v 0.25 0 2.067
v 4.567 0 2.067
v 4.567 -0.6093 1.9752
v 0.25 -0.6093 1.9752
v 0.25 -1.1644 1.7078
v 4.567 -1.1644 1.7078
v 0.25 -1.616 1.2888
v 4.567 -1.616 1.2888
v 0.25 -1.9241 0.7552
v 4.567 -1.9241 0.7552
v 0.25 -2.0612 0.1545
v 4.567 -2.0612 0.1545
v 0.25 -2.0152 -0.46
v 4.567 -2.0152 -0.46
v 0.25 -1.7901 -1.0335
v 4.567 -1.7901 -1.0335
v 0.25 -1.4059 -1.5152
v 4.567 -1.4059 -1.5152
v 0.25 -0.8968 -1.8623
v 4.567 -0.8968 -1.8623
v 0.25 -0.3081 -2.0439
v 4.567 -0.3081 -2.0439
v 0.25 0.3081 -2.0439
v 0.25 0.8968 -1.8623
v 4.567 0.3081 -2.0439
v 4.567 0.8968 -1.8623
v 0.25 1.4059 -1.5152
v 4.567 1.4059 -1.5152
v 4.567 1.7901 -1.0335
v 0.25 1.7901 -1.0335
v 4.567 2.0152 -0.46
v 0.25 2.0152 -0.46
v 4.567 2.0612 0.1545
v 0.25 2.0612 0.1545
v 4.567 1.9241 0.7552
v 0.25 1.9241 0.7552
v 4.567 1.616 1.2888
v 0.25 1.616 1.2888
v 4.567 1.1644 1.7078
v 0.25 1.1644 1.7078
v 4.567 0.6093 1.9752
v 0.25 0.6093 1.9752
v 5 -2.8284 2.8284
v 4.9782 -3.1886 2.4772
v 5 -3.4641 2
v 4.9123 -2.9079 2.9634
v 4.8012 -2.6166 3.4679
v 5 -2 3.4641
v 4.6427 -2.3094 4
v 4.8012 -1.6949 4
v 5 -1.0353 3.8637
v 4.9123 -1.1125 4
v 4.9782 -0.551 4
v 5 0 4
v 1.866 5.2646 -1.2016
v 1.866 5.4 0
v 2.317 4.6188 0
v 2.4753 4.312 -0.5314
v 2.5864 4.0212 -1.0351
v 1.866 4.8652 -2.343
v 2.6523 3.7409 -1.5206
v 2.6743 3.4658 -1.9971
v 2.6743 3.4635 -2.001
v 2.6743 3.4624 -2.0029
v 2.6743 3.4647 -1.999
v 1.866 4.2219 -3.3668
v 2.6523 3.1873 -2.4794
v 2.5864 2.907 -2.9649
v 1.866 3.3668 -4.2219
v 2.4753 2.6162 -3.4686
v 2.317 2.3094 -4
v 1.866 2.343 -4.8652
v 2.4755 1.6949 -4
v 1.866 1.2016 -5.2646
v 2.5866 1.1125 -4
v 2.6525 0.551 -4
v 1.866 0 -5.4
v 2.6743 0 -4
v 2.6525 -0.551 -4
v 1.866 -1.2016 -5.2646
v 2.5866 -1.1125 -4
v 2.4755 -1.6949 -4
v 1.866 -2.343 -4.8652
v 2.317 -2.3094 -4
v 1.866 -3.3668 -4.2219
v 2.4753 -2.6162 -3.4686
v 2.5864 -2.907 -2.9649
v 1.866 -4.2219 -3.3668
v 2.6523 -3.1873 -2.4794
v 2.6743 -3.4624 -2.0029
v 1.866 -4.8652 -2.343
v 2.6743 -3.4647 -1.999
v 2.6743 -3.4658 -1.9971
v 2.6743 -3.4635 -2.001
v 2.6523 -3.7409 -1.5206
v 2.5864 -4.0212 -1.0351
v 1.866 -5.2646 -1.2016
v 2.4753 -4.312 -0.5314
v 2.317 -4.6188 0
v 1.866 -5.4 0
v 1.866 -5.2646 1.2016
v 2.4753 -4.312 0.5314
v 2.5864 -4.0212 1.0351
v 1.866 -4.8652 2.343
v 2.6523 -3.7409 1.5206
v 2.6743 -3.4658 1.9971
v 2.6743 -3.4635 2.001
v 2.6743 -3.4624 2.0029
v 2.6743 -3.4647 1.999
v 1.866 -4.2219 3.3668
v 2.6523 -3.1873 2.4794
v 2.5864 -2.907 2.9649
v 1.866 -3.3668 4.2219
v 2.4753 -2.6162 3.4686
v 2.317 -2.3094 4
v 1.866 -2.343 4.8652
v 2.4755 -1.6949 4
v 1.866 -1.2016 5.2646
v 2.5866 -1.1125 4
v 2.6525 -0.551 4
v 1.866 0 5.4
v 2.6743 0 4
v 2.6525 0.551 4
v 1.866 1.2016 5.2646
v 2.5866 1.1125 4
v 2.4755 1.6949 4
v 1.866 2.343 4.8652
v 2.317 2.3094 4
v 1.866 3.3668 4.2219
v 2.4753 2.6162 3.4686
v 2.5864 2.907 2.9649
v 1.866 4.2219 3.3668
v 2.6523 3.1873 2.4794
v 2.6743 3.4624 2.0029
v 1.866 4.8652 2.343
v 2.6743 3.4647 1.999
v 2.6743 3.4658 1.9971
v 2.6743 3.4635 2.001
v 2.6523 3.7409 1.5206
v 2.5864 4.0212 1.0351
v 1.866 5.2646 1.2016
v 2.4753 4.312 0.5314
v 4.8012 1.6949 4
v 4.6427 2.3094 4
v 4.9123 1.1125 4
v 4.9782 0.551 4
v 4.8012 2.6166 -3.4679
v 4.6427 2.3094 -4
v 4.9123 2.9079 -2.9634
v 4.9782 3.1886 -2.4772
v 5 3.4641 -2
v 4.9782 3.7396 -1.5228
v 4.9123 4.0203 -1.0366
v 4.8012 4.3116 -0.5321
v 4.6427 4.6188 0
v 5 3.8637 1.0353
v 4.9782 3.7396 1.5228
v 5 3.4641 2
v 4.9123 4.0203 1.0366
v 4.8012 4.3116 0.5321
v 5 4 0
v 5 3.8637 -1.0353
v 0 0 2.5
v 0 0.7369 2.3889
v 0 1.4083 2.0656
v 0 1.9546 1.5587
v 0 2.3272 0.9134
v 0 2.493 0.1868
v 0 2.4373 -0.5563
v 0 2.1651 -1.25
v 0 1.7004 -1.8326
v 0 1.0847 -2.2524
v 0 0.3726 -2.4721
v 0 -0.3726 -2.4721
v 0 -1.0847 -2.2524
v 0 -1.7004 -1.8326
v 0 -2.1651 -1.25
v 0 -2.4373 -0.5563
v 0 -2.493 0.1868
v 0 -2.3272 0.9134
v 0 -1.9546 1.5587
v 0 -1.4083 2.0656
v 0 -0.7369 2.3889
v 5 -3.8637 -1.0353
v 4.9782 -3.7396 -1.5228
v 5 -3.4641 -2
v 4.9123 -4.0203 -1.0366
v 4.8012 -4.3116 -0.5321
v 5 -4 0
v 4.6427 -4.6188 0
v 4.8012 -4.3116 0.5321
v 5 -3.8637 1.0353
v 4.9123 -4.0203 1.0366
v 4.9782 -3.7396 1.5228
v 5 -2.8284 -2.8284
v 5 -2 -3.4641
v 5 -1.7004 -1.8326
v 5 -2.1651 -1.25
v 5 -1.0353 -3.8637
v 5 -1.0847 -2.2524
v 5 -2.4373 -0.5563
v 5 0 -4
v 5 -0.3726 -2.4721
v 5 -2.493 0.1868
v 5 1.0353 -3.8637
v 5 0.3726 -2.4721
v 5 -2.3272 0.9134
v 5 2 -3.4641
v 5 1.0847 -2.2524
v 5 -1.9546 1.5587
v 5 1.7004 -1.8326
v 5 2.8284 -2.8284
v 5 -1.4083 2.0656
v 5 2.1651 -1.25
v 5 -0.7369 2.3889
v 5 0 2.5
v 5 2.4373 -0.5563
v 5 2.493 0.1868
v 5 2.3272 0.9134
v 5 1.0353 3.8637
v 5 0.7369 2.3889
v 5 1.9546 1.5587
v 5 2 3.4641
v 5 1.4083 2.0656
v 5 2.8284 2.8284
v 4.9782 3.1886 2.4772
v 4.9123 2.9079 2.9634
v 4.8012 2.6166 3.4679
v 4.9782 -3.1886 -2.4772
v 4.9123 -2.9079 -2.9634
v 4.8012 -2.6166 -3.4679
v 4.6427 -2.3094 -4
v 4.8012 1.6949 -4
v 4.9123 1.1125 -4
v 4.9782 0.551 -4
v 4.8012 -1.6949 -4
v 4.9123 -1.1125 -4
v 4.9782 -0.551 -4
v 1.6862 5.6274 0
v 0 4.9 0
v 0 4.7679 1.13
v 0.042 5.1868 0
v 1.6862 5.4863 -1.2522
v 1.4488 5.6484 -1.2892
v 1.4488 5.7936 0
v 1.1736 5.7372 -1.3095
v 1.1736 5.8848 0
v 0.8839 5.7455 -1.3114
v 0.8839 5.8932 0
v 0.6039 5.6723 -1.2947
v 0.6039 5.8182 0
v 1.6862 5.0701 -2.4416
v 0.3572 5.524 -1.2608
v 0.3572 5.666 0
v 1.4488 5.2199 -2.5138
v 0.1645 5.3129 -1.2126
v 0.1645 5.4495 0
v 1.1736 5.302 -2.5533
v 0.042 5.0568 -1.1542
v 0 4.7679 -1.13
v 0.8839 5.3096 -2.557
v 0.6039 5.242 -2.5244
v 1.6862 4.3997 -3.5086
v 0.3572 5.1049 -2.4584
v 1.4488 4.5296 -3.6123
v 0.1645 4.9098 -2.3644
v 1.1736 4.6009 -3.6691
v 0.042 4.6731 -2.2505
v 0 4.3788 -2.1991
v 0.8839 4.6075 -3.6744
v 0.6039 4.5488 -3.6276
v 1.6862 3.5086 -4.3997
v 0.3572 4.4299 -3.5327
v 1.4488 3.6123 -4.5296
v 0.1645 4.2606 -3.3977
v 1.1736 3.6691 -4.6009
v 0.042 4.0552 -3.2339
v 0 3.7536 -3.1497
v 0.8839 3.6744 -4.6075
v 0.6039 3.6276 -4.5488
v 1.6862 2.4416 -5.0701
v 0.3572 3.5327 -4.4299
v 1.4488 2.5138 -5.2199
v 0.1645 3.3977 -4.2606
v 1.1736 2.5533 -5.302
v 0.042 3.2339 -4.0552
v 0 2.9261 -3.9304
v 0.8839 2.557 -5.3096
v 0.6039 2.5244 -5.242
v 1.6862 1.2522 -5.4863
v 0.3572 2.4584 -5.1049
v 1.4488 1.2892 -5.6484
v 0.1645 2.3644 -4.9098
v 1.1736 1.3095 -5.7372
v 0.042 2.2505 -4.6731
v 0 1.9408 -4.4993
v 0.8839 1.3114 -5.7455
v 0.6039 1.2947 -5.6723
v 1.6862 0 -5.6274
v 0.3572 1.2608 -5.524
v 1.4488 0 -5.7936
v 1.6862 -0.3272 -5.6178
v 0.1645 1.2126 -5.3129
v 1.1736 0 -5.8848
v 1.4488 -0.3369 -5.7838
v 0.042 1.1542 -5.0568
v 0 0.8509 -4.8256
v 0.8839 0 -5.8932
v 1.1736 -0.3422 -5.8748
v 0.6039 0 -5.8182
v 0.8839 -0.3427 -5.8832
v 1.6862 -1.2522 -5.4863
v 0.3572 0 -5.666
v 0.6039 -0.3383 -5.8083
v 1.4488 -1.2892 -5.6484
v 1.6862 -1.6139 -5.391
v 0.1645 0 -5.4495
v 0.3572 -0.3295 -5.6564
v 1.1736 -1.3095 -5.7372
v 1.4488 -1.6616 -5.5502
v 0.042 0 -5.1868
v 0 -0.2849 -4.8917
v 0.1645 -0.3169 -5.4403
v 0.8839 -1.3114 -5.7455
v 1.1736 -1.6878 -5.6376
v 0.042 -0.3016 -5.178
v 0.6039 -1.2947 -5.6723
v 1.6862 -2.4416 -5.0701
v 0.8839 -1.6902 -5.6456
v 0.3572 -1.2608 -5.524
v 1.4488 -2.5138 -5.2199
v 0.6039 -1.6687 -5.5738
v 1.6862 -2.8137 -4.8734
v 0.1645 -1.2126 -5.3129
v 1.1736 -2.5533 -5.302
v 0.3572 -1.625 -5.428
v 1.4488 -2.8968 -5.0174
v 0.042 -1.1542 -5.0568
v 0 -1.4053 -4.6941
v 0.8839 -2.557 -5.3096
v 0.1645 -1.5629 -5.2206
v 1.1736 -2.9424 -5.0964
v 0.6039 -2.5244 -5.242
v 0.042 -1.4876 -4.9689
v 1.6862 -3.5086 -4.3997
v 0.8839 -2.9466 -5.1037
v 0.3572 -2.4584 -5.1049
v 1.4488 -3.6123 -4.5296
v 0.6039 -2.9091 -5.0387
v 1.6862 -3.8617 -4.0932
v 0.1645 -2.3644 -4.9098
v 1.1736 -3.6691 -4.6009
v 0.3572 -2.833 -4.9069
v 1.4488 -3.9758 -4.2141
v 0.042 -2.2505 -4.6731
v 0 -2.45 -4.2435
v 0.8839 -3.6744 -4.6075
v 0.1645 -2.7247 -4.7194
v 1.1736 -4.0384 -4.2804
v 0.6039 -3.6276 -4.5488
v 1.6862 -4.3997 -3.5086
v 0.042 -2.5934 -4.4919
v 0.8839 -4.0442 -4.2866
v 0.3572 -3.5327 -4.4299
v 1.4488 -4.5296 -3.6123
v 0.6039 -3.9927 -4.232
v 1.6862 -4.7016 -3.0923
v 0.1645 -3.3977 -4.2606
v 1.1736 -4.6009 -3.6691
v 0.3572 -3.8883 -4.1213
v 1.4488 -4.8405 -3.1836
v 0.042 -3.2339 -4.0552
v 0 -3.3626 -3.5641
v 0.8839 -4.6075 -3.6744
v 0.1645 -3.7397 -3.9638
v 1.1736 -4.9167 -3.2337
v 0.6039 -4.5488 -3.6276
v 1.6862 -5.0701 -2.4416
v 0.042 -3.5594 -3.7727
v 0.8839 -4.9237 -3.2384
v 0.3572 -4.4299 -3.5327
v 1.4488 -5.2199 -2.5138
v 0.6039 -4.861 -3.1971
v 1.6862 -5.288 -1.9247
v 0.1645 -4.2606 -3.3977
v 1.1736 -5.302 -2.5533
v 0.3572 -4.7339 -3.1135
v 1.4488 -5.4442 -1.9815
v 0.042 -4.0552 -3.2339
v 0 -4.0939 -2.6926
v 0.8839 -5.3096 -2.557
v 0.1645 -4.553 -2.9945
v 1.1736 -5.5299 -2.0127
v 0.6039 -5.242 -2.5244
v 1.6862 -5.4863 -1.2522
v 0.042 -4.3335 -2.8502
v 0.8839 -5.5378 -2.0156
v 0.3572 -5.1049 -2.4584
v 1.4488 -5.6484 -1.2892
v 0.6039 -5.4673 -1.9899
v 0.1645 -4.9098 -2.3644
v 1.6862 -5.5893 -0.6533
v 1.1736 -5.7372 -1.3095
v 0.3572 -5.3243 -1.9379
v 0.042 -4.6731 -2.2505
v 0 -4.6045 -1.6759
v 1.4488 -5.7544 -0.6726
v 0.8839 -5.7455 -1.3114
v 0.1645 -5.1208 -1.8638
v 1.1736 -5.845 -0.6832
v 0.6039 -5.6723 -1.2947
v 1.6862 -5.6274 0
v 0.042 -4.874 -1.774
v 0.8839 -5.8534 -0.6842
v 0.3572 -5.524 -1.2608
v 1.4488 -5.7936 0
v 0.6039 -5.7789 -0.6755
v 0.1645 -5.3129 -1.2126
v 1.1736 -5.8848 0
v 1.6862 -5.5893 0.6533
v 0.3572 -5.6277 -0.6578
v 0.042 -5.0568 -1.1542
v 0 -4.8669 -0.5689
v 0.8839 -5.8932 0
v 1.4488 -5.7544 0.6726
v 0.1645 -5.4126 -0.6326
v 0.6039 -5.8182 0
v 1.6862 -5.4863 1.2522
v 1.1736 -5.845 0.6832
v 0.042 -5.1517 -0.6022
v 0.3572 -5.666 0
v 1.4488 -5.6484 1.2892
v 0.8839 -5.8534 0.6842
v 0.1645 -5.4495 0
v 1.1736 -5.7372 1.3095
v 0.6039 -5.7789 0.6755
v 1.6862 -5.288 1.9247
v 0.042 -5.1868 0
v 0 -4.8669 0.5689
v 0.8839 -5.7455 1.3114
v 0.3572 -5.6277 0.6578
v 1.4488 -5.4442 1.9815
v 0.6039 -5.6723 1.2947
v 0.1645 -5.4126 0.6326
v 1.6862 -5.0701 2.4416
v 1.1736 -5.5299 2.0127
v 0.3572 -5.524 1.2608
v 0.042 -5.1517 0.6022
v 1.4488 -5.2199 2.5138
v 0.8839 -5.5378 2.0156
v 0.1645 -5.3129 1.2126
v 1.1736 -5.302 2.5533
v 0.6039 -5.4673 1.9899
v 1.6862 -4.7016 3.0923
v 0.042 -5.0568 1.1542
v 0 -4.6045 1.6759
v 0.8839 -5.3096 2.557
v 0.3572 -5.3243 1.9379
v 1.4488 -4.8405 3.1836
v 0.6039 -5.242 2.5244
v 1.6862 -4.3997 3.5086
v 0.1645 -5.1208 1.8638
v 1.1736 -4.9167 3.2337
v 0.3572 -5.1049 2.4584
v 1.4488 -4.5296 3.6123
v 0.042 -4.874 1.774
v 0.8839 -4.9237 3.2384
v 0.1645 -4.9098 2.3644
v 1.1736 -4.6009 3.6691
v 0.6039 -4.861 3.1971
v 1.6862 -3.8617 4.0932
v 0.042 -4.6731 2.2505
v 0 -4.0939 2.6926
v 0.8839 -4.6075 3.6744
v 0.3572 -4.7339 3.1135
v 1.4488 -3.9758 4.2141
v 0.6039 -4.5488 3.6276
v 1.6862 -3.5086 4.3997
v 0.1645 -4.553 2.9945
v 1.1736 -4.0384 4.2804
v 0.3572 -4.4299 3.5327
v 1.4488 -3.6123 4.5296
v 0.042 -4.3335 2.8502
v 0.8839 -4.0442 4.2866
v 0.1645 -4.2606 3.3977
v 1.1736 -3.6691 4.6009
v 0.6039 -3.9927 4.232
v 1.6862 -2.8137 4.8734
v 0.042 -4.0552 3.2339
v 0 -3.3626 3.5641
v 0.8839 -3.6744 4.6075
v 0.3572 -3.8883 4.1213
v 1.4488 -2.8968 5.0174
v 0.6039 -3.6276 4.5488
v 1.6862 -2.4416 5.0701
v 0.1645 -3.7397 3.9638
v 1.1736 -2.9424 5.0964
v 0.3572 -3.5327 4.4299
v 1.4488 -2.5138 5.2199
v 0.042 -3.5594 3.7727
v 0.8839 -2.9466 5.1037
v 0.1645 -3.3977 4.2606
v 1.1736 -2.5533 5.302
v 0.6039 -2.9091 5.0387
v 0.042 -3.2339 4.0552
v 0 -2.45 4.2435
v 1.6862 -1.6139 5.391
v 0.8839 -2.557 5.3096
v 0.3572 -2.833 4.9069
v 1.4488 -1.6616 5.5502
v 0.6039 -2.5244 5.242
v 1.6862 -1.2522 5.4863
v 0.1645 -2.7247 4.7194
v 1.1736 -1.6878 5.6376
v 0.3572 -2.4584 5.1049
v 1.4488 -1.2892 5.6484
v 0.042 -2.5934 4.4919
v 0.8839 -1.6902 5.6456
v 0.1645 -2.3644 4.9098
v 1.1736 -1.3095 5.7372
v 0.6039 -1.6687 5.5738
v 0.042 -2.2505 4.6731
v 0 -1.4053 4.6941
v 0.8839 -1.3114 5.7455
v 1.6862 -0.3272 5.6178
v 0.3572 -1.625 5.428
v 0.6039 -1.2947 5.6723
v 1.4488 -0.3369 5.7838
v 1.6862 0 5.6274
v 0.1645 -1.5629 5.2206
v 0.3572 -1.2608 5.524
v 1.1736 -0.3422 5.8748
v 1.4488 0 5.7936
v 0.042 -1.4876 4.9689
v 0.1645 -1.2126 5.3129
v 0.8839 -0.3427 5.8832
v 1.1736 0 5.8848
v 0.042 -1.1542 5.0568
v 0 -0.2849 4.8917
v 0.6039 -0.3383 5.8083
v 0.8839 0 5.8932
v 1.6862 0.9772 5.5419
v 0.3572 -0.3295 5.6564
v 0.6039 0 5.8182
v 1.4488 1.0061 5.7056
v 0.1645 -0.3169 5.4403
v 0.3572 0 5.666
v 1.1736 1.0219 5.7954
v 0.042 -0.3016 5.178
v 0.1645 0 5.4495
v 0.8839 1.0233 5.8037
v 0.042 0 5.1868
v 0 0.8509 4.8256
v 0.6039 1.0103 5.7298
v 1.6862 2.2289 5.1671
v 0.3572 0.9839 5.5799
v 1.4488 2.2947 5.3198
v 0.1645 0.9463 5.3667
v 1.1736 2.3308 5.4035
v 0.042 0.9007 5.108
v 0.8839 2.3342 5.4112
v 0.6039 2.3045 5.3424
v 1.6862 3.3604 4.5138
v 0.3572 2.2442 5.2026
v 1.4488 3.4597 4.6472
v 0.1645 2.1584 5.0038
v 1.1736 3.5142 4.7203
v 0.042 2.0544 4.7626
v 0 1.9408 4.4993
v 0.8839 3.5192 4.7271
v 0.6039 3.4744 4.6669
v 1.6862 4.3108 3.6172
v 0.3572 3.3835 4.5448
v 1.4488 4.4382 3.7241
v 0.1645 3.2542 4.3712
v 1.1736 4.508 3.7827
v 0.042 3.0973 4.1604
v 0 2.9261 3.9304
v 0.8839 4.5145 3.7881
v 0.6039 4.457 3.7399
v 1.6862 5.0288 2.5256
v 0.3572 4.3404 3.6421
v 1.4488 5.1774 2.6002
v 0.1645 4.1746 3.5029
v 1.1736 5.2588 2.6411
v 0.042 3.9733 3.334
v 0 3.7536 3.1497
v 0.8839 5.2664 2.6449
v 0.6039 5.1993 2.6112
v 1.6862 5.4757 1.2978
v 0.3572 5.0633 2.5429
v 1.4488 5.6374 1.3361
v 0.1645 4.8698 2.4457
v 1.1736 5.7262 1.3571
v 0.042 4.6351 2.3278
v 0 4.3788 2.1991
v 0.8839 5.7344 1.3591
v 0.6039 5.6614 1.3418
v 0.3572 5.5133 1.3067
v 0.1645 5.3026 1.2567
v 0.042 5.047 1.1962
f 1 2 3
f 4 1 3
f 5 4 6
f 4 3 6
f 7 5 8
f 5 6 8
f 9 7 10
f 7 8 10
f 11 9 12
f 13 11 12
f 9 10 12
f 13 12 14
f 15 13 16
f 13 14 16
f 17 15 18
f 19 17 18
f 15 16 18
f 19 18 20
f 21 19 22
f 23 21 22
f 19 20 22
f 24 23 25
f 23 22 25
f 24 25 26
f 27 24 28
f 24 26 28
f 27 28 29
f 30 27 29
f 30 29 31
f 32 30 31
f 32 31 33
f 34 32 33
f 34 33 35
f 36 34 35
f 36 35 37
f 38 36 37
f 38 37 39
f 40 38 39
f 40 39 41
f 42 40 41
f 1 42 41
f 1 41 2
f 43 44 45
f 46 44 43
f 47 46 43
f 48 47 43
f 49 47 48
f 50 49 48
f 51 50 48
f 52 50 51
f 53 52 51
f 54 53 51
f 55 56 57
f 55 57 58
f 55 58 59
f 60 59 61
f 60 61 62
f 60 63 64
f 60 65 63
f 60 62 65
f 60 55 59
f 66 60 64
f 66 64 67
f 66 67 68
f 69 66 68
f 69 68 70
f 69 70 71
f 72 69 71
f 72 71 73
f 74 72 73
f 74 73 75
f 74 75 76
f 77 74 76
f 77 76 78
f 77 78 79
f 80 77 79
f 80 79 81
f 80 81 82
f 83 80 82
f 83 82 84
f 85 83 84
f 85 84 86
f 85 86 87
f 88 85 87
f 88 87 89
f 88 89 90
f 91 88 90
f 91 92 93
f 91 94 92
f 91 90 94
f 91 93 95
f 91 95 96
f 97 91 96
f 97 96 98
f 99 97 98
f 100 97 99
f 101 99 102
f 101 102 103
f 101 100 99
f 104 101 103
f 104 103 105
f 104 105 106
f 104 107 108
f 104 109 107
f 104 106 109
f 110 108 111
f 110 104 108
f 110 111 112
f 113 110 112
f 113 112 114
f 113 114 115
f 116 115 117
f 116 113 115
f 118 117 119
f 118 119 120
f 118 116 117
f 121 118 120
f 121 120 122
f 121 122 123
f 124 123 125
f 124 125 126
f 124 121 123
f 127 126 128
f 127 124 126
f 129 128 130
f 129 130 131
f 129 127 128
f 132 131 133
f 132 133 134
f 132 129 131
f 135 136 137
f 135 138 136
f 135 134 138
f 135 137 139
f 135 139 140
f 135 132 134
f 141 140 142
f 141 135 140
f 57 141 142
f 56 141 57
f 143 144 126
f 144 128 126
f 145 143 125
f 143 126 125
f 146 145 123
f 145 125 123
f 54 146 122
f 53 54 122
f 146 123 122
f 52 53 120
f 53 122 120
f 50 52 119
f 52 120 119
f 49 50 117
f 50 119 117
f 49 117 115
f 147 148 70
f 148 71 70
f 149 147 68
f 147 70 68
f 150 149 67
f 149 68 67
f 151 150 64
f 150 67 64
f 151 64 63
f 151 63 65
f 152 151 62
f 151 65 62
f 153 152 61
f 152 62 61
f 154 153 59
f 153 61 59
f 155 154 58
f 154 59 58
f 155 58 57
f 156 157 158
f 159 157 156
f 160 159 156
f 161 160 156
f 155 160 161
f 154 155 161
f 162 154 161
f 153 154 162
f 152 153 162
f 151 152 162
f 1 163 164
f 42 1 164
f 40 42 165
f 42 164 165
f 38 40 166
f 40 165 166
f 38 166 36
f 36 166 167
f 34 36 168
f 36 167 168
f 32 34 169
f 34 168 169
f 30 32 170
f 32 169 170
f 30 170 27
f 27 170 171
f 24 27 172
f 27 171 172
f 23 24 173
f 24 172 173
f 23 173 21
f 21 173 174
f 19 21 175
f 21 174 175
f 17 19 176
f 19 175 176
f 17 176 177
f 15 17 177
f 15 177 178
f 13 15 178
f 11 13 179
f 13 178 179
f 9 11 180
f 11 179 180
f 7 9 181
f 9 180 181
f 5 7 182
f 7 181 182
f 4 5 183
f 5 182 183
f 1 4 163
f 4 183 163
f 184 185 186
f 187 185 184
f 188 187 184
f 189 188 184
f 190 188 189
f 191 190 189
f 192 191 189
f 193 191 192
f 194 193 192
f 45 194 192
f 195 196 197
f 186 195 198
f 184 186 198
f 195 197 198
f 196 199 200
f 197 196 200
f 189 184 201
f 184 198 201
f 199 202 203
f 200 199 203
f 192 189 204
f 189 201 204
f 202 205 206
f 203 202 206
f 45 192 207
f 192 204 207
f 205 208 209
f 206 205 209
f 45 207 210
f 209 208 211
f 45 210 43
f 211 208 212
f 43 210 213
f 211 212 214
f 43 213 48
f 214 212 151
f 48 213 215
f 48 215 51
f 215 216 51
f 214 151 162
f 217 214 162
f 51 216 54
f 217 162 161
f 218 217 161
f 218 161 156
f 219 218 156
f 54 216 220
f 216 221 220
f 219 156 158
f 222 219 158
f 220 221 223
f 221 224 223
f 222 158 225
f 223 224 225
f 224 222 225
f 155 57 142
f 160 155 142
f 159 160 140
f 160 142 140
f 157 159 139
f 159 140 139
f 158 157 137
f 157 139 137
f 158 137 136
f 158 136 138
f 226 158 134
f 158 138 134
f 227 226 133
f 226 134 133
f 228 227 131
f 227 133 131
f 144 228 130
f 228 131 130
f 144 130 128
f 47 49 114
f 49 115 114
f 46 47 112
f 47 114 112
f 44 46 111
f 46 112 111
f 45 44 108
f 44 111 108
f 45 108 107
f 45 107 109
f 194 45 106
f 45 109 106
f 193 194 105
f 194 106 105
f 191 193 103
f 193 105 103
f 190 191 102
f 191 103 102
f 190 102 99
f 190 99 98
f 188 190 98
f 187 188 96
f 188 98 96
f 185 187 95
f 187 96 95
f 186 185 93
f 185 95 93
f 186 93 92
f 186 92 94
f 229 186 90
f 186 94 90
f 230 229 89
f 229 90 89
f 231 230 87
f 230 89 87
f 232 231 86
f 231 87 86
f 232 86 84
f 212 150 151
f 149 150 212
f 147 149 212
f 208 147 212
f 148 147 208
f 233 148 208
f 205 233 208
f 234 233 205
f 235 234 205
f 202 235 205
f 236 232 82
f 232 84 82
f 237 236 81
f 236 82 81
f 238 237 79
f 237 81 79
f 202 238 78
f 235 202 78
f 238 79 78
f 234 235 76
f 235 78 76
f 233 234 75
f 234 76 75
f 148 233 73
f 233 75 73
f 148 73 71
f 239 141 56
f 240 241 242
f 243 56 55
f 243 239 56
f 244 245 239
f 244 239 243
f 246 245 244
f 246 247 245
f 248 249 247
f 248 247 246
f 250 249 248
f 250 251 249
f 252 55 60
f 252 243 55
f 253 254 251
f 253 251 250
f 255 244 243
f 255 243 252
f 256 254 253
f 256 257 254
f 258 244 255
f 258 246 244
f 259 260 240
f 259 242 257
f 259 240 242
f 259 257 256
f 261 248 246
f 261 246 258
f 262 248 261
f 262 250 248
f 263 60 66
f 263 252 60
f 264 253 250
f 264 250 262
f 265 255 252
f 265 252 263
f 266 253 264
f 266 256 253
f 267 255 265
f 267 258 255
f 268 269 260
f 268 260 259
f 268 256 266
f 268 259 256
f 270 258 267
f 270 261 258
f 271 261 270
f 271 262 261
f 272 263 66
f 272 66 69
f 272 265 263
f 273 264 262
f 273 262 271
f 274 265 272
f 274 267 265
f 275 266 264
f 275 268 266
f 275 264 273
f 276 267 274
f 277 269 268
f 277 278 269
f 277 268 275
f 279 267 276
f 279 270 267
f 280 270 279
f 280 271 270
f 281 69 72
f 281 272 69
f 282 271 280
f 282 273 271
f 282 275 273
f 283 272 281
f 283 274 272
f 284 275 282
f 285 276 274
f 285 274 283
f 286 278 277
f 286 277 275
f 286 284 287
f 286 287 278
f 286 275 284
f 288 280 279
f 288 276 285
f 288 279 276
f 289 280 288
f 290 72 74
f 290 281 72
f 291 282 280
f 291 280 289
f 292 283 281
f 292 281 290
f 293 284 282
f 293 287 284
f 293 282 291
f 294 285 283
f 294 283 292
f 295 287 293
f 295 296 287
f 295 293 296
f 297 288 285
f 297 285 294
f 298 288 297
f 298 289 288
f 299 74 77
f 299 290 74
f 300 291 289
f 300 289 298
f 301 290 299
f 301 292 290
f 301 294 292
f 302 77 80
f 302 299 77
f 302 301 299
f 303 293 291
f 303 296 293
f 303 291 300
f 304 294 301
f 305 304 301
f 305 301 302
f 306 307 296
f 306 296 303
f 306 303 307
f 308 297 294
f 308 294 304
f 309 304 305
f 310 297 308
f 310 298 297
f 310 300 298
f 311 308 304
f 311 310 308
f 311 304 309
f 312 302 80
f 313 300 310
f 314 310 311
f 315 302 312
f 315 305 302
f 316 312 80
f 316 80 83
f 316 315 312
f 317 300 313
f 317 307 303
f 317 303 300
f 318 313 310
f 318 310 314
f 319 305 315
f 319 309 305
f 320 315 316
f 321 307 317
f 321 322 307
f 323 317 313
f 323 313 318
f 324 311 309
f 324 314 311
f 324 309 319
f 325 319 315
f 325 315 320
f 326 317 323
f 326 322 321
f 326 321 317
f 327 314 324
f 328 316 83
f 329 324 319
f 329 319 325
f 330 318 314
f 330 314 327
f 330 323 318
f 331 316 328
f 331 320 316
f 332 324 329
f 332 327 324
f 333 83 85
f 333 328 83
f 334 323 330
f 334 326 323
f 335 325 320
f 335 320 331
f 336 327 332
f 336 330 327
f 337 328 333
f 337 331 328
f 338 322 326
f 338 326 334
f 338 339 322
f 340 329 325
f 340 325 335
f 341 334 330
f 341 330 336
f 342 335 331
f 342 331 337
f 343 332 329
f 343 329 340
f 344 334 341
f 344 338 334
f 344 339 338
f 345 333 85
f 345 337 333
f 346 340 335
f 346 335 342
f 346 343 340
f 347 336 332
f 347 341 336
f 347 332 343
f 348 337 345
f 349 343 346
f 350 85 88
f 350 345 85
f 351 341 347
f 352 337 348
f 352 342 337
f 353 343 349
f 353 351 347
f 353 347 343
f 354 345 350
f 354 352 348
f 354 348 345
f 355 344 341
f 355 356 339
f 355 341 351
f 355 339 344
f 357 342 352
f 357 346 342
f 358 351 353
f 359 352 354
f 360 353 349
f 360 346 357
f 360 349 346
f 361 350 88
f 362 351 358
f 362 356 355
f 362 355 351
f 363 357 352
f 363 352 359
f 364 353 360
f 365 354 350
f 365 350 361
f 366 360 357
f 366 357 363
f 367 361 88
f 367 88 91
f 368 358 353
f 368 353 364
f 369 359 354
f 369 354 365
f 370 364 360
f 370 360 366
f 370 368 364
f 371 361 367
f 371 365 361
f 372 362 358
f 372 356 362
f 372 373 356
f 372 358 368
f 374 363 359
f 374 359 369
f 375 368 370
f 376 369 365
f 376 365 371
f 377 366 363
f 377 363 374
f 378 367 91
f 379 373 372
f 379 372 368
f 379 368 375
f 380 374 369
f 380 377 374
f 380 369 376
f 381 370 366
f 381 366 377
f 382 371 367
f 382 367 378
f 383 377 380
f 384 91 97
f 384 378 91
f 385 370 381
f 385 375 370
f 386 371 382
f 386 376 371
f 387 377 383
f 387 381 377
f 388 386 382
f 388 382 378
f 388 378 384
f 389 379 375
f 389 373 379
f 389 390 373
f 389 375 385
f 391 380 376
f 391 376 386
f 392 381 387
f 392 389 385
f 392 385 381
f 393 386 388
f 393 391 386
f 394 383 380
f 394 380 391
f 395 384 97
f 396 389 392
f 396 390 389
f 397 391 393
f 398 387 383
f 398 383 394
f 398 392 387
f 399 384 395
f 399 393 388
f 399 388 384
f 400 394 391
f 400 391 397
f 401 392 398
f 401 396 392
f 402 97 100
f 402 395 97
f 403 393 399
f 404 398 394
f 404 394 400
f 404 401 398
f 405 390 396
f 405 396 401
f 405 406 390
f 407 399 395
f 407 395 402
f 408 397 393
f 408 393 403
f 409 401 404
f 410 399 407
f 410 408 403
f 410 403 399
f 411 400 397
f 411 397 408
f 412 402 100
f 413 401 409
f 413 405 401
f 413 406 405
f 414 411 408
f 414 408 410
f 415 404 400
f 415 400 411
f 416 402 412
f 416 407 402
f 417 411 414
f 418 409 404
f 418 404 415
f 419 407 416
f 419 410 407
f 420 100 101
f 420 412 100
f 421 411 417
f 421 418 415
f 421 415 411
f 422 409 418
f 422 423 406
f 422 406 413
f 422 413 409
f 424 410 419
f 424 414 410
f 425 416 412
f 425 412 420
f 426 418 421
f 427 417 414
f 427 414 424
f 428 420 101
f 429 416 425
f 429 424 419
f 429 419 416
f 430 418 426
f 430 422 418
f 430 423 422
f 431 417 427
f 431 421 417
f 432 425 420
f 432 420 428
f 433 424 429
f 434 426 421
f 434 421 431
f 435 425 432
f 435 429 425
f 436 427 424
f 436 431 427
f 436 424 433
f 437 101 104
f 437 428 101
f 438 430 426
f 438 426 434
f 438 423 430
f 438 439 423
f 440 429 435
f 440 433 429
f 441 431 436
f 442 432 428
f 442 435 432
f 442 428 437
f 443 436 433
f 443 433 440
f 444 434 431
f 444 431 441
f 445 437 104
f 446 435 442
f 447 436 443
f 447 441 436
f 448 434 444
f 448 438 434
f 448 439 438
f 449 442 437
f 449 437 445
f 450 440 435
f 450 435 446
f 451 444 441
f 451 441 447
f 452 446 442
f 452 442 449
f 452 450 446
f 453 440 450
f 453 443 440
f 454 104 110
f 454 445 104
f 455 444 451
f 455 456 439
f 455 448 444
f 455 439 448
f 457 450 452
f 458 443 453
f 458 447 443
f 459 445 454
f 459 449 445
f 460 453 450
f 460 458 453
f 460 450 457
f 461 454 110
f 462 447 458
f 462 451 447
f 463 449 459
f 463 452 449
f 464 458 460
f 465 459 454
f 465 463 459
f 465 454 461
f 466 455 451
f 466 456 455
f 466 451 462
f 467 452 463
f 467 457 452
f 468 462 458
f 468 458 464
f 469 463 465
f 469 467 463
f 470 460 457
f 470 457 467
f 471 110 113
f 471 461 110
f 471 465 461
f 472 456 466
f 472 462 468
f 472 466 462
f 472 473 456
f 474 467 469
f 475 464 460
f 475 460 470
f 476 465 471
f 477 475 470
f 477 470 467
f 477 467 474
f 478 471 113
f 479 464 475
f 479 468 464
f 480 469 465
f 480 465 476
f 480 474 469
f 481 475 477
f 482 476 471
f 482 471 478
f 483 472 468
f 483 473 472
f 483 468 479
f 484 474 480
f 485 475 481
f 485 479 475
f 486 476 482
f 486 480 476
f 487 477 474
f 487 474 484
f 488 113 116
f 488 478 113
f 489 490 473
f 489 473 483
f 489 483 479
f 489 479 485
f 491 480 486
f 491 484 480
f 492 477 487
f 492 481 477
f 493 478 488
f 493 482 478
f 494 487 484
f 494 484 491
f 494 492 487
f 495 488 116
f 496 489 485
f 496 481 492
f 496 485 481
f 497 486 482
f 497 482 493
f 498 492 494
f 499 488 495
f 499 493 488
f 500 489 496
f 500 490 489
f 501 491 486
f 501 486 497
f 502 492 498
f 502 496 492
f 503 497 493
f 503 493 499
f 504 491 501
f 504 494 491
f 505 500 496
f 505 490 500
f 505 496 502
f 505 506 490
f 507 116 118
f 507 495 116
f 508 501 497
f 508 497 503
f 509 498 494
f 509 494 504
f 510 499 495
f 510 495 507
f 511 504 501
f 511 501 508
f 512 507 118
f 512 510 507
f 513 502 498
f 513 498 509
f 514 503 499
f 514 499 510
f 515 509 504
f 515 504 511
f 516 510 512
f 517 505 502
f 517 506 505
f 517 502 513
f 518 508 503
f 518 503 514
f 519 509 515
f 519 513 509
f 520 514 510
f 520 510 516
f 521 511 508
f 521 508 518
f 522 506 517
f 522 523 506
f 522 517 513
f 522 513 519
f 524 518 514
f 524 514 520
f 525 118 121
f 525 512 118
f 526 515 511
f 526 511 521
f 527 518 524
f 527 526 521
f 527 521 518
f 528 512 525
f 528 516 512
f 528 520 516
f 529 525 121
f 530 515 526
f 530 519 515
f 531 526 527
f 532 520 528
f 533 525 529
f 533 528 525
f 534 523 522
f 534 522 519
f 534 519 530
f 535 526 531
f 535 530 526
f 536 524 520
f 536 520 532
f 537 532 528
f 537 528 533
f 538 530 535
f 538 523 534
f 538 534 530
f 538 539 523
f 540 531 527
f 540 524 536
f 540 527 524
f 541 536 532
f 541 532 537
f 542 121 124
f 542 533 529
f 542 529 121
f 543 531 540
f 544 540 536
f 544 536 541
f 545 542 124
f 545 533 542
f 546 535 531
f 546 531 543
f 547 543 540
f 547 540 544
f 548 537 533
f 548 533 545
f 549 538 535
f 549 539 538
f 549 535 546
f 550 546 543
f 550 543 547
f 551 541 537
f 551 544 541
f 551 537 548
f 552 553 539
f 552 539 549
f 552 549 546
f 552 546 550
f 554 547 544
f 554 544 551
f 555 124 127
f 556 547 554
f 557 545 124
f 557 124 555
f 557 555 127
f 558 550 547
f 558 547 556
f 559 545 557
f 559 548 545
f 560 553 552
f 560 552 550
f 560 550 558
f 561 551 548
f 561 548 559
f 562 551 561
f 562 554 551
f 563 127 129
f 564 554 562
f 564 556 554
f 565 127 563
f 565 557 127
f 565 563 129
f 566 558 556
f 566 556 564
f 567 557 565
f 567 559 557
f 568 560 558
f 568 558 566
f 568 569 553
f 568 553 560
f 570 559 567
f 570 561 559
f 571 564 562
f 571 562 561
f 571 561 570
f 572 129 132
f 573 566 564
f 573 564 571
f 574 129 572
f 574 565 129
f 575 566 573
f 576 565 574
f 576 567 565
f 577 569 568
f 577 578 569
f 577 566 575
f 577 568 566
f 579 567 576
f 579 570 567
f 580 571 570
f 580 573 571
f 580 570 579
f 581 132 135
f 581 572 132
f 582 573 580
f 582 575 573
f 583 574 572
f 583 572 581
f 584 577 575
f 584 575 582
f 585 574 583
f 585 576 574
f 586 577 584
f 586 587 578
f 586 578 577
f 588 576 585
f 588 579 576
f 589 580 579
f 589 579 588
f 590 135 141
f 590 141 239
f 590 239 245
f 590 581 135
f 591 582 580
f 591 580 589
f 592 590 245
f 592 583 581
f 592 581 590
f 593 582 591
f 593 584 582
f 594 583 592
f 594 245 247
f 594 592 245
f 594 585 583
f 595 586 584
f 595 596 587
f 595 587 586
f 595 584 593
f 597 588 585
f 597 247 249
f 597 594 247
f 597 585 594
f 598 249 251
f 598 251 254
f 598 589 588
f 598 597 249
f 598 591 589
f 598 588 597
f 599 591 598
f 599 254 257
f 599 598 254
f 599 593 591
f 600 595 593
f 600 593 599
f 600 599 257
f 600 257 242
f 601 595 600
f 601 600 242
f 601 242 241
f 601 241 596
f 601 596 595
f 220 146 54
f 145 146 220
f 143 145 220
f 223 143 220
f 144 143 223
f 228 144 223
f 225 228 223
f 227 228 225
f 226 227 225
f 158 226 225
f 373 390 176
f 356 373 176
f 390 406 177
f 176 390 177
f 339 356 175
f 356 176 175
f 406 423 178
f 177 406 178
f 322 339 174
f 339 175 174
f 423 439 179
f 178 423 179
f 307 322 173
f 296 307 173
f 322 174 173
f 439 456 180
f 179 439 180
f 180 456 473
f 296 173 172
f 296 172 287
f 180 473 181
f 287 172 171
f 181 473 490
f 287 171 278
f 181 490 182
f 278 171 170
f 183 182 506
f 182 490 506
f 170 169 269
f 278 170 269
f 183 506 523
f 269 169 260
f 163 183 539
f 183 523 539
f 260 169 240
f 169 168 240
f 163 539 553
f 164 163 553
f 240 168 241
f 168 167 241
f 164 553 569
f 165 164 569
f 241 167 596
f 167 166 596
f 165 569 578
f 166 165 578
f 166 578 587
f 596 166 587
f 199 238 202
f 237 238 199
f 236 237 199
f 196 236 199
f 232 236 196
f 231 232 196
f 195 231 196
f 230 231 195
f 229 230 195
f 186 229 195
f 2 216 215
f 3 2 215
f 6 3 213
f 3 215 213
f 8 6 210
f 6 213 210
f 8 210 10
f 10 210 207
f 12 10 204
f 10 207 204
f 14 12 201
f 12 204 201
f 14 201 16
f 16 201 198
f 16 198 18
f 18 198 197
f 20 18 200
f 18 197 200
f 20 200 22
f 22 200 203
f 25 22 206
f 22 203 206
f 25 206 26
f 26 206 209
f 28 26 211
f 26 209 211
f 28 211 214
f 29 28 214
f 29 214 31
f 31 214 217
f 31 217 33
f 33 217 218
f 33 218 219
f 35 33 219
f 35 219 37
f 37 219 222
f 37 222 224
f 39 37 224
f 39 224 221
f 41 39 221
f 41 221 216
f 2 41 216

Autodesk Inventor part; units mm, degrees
ref_plane "YZ Plane" through (0, 0, 0) normal (1, 0, 0) x (0, 1, 0)
ref_plane "XZ Plane" through (0, 0, 0) normal (0, 1, 0) x (-1, 0, 0)
sketch "Sketch1" plane through (0, 0, 0) normal (0, 0, 1) x (1, 0, 0)
  line L0 (-1.2302, 0) -> (6.0384, 0) projected
  line L1 (2.6743, 4) -> (1.866, 5.4)
  line L2 (2.6743, 4) -> (5, 4) construction
  line L3 (5, 4) -> (5, 0) construction
  arc A0 (1.866, 5.4) -> (0, 4.9) centre (1, 4.9) ccw
  line L4 (2.6743, 4) -> (2.6743, 0)
  line L5 (0, -1.2232) -> (0, 7.3391) projected
  point P0 (0, 0)
  dimension "d2" = 8
  dimension "d4" = 11.8
  dimension "d5" = 1
  dimension "d15" = 5
  dimension "d16" = 30
revolve "Ring" add sketch "Sketch1" angle 360 about axis through (-10, 0, 0) along (1, 0, 0)
sketch "Sketch2" plane through (0, 0, 0) normal (-1, 0, 0) x (0, 0, 1)
  circle A0 centre (0, 0) radius 4.9
  line L0 (-4, -2.3094) -> (-4, 2.3094)
  line L1 (-4, 2.3094) -> (0, 4.6188)
  line L2 (0, 4.6188) -> (4, 2.3094)
  line L3 (4, 2.3094) -> (4, -2.3094)
  line L4 (4, -2.3094) -> (0, -4.6188)
  line L5 (0, -4.6188) -> (-4, -2.3094)
  circle A1 centre (0, 0) radius 4.9 projected
  dimension "d6" = 9.2376
extrude "Body" add sketch "Sketch2" against normal blind 5 contours L0 L1 L2 L3 L4 L5
sketch "Sketch3" plane through (0, 0, 0) normal (0, 0, 1) x (1, 0, 0)
  line L0 (2.3171, 4.6188) -> (5, 4.6188) projected
  line L1 (5, 2.3094) -> (5, 4.6188) projected
  line L2 (0, -4.9) -> (0, 4.9) projected
  line L3 (-1, 0) -> (6, 0) projected
  line L4 (4.6427, 4.6188) -> (5, 4)
  dimension "d10" = 30
  dimension "d11" = 8
revolve "Chamfer1" cut sketch "Sketch3" angle 360 about axis through (-10, 0, 0) along (1, 0, 0)
sketch "Sketch4" plane through (0, 0, 0) normal (-1, 0, 0) x (0, 0, 1)
  circle A0 centre (0, 0) radius 4.9 projected
hole "Thread" at (0, 0, 0) direction (1, 0, 0) diameter 4.134 end through all thread size "M5x0.8" class "6H" standard "ANSI Metric M Profile"
chamfer "Chamfer2" distance 0.433 angle 30 1 edges at (0, 0, -2.067) measured on face at (0, 3.9032, -0.4739)
ref_plane "Work Plane1" through (17.4207, 0, 0) normal (0, 0, -1) x (-1, 0, 0)
chamfer "Chamfer3" distance 0.433 angle 45 1 edges at (5, 0, -2.067)
equation "\"d6\" = 1.1547 * SW"
equation "\"d7\" = KOH"
equation "\"d12\" = -0.5 * GD1 + 0.5 * NND"
equation "\"d46\" = -0.5 * GD1 + 0.5 * NND"
equation "\"d51\" = -0.5 * GD1 + 0.5 * NND"
equation "\"d2\" = SW"
equation "\"d4\" = LADI"
equation "\"d5\" = PHH"
equation "\"d15\" = KOH"
equation "\"d16\" = KEWI"
equation "\"d10\" = ANG1"
equation "\"d11\" = SW0"
equation "\"ANG1\" = 30deg"
equation "\"KEWI\" = 30deg"
equation "\"NND\" = 5"
equation "\"LADI\" = 11.8"
equation "\"SW\" = 8"
equation "\"PHH\" = RR"
equation "\"KOH\" = 5"
equation "\"SW0\" = SW"
equation "\"d1\" = LADI"
equation "\"d3\" = PHH"
equation "\"GUL\" = 0.541266 * PTC"
equation "\"RR\" = 1"
equation "\"THREADDIA\" = 5"
equation "\"TOA\" = 30deg"
equation "\"PTC\" = 0.8"
equation "\"RR1\" = 0.3"
equation "\"GAL\" = 0.541266 * PTC"
equation "\"E0\" = 1.155 * SW"
equation "\"GD1\" = 4.133975"
properties part number "ANSI B18.2.4.4M - M5 x 0.8" material "Steel, Mild"
